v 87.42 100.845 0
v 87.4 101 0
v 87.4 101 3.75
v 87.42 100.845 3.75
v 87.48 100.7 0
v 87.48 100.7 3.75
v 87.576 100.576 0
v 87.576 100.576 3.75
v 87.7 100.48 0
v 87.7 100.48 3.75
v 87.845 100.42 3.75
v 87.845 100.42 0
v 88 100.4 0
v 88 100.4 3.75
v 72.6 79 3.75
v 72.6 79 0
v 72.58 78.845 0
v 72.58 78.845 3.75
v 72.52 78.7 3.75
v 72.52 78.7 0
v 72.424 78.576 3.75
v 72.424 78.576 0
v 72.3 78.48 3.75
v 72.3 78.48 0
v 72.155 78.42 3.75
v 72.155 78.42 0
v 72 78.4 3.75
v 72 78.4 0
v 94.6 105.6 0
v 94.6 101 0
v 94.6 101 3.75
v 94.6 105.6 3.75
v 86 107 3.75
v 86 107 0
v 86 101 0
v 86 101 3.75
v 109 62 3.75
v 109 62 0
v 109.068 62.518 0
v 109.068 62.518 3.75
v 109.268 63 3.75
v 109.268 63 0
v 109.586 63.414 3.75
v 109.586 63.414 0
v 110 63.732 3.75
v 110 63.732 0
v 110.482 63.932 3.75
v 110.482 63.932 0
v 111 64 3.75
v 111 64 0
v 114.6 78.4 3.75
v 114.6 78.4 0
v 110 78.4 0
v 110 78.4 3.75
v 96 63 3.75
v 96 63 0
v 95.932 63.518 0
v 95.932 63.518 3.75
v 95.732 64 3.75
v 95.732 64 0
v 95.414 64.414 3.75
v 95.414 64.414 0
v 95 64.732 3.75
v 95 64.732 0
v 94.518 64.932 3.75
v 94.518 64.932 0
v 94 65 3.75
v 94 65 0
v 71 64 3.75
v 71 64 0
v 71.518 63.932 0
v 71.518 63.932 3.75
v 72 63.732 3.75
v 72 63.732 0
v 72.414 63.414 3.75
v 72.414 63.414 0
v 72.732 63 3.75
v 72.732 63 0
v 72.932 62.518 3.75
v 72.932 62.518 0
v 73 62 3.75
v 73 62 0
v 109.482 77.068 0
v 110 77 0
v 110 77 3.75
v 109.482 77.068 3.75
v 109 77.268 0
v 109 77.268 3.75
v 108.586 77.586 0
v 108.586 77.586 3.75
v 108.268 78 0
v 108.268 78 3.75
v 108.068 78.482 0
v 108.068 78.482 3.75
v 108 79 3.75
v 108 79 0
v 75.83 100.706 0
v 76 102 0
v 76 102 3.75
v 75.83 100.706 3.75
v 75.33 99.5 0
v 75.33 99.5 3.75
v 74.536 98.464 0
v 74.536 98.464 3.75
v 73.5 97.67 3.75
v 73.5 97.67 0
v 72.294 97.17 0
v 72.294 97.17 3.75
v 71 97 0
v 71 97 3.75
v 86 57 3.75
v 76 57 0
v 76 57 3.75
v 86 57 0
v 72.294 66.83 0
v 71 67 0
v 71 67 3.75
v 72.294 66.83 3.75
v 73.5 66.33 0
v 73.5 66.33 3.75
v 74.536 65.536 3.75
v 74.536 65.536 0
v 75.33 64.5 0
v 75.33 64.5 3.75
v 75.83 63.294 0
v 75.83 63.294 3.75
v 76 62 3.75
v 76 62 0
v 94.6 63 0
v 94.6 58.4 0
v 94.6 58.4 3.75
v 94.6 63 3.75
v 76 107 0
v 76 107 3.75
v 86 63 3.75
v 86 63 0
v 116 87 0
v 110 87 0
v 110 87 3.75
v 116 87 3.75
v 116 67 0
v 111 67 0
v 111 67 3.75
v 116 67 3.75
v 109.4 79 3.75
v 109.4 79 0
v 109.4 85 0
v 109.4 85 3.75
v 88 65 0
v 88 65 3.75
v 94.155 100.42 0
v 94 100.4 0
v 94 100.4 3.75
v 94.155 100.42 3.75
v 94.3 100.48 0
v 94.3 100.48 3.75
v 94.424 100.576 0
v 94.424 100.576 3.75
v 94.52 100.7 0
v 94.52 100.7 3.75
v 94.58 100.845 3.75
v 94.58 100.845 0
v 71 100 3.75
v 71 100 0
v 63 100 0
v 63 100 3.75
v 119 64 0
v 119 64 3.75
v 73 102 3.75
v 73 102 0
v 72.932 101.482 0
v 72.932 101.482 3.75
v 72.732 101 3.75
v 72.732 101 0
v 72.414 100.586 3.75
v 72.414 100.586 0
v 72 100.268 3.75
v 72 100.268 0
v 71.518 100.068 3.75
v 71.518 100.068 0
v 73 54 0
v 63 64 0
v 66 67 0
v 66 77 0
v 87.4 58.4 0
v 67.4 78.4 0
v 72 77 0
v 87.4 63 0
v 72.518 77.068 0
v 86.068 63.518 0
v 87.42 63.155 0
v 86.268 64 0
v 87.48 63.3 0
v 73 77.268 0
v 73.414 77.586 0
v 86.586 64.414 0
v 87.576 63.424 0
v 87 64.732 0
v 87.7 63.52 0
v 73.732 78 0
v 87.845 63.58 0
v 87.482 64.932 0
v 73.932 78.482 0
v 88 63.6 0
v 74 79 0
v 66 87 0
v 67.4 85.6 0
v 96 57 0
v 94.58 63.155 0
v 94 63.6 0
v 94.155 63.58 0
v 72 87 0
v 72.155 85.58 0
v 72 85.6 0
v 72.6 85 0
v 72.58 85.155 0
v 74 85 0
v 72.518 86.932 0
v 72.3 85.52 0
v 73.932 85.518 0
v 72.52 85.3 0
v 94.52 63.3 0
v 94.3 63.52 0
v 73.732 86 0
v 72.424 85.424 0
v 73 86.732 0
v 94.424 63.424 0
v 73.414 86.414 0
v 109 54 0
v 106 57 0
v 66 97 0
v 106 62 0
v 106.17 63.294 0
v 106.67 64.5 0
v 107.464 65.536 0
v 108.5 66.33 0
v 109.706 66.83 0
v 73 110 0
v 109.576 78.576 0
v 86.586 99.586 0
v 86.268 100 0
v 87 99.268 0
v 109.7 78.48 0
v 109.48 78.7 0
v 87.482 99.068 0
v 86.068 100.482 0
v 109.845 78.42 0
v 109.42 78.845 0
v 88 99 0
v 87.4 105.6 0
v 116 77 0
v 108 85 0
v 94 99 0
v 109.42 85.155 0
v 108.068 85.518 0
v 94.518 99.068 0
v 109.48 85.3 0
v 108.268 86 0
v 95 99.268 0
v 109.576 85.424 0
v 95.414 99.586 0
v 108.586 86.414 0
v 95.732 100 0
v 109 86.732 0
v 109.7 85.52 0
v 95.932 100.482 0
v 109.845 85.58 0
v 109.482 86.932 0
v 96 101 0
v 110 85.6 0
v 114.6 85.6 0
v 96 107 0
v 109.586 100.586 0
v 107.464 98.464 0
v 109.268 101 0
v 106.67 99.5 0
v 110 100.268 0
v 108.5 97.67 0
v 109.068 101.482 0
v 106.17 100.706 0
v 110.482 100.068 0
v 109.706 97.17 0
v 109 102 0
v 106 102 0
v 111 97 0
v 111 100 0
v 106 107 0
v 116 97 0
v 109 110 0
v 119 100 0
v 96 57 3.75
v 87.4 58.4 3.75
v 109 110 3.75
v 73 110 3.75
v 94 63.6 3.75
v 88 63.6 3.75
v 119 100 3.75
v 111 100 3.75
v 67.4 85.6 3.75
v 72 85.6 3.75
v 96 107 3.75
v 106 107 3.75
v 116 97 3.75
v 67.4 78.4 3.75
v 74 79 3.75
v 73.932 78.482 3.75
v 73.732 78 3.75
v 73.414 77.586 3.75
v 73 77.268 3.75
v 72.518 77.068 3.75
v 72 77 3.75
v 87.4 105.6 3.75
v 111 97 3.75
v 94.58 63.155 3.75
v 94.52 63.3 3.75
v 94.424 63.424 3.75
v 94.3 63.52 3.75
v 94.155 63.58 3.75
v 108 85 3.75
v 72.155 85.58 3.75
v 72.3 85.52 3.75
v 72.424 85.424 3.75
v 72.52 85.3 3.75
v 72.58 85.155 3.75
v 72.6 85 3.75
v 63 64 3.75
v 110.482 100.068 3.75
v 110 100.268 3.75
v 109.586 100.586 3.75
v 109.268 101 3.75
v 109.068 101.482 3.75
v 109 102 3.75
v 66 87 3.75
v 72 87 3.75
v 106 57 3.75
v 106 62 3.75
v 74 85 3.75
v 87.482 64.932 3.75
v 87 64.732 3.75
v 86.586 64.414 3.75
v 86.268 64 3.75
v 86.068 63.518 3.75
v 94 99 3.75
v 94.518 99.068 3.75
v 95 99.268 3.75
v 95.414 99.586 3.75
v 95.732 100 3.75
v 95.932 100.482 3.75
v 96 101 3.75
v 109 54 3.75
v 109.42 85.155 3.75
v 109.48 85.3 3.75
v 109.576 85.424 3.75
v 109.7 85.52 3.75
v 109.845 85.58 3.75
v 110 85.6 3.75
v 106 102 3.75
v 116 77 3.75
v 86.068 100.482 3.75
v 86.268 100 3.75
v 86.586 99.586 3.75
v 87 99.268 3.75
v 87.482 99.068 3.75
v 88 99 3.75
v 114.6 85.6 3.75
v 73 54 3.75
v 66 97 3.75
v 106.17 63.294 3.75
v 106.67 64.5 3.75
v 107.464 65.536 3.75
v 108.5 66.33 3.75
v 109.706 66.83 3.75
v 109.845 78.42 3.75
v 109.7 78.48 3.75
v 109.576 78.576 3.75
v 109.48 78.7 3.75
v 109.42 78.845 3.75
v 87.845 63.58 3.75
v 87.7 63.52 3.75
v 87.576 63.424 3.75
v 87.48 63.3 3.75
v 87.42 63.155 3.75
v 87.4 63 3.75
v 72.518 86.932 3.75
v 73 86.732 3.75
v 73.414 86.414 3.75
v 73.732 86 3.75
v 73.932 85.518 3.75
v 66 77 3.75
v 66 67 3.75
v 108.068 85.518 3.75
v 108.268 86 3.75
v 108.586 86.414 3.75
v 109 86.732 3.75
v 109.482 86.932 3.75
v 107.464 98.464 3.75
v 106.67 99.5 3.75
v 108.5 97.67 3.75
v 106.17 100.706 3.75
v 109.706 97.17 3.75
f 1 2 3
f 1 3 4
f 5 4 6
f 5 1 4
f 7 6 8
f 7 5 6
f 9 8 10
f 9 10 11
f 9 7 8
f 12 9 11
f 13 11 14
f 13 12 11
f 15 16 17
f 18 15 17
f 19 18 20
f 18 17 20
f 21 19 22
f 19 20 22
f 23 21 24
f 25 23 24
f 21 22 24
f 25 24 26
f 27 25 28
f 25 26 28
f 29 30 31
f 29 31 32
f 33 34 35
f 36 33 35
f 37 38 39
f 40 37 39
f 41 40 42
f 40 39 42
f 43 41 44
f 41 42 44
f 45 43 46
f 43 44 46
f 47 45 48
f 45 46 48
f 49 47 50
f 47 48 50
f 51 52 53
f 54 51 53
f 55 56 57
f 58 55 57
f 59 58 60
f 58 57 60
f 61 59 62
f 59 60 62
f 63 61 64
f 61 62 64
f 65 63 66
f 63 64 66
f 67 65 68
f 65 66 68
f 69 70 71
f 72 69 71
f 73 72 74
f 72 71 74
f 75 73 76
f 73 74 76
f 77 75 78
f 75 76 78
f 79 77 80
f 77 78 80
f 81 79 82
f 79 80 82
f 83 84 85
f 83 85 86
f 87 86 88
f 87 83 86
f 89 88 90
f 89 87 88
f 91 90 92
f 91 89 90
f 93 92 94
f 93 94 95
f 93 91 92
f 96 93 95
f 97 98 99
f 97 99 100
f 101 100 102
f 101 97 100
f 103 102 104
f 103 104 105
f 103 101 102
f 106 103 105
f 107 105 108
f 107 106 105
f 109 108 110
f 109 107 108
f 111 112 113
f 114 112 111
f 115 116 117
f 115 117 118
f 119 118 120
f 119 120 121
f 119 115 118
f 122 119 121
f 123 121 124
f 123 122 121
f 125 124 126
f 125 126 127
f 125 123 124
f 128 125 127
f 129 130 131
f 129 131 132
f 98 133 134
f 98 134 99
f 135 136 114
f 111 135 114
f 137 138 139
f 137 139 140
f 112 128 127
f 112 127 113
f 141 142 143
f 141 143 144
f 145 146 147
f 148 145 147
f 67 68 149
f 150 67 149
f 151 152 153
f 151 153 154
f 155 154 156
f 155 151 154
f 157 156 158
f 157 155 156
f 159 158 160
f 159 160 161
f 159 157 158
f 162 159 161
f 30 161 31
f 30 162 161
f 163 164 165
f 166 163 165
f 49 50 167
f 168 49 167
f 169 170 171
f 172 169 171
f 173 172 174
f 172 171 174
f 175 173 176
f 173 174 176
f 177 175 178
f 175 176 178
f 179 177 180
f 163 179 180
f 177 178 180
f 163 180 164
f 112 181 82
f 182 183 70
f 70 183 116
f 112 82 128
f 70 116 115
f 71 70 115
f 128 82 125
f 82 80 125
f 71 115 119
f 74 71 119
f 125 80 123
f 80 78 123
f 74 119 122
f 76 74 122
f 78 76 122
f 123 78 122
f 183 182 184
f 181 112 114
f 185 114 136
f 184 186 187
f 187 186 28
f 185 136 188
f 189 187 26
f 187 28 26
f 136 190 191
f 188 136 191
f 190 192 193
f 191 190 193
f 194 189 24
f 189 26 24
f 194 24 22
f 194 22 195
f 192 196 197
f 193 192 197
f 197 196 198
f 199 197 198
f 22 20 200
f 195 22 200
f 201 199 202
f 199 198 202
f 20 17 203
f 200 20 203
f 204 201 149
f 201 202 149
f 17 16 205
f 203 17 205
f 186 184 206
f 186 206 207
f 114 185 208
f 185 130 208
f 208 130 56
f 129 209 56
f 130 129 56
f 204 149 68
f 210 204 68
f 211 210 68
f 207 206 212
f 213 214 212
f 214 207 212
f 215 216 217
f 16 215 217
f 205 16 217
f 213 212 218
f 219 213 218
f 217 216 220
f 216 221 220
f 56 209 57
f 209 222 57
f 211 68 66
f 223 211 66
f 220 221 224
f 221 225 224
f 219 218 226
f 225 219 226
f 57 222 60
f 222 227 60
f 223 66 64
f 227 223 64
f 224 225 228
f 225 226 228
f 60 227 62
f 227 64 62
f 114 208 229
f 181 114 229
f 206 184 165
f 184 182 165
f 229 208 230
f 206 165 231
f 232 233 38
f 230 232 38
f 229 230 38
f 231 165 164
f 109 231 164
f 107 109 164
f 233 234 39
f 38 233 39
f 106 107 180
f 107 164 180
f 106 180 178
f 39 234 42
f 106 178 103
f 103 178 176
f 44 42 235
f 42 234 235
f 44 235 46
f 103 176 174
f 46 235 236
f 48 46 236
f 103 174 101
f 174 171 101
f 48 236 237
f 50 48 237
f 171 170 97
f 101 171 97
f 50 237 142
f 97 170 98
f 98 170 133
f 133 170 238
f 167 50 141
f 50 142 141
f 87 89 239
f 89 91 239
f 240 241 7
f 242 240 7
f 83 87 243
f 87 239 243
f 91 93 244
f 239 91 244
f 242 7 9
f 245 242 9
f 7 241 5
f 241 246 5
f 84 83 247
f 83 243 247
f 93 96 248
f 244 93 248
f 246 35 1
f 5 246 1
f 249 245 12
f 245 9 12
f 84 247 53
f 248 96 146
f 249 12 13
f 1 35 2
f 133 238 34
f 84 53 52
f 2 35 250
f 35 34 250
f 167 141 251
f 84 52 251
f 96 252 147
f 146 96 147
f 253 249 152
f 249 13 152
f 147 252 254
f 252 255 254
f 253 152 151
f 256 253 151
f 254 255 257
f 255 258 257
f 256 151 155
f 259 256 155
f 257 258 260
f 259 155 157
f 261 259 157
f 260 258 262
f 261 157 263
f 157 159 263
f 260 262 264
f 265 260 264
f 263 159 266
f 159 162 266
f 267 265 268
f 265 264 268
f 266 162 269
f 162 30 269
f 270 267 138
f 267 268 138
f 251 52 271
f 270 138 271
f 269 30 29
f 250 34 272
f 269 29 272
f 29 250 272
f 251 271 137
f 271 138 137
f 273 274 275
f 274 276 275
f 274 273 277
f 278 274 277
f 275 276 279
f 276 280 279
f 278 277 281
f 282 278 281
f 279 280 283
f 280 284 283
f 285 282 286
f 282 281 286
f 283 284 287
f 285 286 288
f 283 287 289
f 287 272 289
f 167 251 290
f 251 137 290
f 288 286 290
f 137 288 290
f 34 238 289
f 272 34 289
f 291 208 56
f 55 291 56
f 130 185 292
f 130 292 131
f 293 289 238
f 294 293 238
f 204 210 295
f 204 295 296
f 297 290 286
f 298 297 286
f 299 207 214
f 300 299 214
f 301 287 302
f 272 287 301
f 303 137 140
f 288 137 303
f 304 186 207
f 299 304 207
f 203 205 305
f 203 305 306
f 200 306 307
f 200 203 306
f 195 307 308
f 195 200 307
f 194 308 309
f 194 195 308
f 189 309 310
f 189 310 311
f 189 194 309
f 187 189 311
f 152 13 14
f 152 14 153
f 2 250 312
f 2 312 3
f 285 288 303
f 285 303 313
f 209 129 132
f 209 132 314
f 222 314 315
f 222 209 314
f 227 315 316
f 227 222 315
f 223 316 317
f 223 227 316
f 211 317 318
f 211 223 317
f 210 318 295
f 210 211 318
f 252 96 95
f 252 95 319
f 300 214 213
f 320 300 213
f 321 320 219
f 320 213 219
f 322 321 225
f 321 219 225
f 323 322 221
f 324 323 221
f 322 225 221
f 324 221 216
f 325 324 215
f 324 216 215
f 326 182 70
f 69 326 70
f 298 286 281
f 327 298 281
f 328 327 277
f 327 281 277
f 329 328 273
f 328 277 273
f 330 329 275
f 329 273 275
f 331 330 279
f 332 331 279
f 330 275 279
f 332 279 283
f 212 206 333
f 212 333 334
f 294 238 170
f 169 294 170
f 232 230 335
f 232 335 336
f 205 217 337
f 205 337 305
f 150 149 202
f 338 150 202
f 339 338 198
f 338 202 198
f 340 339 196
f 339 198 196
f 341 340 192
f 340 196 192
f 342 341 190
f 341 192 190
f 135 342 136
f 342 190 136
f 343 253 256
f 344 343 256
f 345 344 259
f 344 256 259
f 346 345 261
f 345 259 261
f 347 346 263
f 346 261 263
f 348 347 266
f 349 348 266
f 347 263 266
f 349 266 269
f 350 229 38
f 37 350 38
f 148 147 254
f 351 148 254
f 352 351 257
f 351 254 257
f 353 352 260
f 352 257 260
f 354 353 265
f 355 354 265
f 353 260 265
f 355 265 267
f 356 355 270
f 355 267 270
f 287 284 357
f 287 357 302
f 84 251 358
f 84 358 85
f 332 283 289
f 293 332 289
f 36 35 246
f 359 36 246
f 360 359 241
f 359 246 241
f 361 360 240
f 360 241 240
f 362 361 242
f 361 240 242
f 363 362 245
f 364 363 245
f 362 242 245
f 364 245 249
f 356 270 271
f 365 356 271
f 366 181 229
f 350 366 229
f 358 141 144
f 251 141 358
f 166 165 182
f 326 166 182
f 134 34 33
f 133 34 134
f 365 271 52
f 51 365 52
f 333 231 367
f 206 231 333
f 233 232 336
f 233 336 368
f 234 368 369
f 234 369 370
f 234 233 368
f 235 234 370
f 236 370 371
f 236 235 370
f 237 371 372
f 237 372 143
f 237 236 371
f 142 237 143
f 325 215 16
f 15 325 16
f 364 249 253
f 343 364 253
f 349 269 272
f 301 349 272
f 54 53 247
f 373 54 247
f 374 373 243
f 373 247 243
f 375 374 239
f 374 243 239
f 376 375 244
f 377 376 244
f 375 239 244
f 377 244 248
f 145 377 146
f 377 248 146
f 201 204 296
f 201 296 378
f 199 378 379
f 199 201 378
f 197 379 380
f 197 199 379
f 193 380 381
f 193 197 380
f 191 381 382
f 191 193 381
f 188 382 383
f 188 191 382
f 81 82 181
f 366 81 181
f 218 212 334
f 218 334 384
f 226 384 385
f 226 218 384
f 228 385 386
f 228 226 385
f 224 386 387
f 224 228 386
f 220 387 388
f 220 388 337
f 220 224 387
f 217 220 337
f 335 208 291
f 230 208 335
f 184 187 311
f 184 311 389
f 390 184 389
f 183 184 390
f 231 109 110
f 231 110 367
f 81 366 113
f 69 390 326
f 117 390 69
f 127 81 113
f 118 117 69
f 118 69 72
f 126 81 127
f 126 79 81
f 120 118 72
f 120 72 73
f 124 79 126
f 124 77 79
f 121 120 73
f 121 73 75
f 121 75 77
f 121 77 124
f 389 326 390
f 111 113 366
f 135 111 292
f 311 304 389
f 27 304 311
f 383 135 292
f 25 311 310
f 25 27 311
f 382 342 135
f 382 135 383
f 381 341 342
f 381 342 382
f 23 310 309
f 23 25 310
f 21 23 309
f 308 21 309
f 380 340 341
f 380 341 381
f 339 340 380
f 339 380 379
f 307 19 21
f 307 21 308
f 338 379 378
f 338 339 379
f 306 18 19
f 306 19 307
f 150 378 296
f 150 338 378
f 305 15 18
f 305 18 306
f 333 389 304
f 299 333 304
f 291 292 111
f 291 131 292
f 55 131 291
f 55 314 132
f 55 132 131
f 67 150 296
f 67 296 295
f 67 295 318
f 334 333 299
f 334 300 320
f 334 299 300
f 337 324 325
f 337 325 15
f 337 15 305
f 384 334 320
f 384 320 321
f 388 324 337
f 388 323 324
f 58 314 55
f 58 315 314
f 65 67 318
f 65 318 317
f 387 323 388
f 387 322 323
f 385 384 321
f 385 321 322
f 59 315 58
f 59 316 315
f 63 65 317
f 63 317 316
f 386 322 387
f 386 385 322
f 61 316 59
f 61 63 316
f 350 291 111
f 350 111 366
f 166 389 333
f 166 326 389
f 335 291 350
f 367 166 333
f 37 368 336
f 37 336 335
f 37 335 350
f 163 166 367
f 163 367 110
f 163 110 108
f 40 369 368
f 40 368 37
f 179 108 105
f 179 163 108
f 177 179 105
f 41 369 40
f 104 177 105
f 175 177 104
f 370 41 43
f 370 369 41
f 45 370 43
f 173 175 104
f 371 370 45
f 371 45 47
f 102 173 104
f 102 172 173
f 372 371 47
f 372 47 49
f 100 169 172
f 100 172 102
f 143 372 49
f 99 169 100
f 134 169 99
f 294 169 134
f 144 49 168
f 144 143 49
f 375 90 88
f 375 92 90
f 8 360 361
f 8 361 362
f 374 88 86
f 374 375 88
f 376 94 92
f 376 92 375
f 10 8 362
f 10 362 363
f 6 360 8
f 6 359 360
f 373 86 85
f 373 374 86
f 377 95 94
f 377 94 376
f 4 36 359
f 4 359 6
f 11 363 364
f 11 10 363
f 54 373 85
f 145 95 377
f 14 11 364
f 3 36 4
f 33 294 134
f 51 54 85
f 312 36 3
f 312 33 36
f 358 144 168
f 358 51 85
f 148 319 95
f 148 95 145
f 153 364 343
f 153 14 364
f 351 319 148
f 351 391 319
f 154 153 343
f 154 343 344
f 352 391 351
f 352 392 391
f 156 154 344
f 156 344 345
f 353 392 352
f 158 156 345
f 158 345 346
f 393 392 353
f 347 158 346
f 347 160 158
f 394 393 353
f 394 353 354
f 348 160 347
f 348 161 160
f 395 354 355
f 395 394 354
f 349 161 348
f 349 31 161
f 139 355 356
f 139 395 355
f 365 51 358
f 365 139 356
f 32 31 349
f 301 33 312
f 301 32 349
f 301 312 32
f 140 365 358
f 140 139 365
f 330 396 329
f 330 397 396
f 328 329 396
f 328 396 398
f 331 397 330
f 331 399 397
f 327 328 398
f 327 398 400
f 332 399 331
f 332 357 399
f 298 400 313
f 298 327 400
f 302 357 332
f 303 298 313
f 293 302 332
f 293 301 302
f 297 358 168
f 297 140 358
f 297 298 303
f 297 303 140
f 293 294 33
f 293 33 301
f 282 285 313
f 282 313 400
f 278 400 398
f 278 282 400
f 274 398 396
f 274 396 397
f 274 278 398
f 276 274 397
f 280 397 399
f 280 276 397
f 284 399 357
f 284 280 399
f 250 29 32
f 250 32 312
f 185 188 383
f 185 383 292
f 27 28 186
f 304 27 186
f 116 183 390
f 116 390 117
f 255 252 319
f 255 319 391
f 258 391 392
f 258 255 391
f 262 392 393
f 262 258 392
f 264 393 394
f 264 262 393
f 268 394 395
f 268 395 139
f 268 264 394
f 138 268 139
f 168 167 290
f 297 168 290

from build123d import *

# Parameters (mm, degrees)
EXTRUDE_THIN1_DEPTH = 3.75
EXTRUDE_THIN2_DEPTH = 3.75
EXTRUDE_THIN3_DEPTH = 3.75


with BuildPart() as part:
    # Sketch1 → Extrude-Thin1 (new body)
    with BuildSketch(Plane.XY):
        with BuildLine():
            Line((73, 62), (73, 54))
            Line((73, 54), (109, 54))
            Line((109, 54), (109, 62))
            ThreePointArc((109, 62), (109.585786438, 63.414213562), (111, 64))
            Line((111, 64), (119, 64))
            Line((119, 64), (119, 100))
            Line((119, 100), (111, 100))
            ThreePointArc((111, 100), (109.585786438, 100.585786438), (109, 102))
            Line((109, 102), (109, 110))
            Line((109, 110), (73, 110))
            Line((73, 110), (73, 102))
            ThreePointArc((73, 102), (72.414213562, 100.585786438), (71, 100))
            Line((71, 100), (63, 100))
            Line((63, 100), (63, 64))
            Line((63, 64), (71, 64))
            ThreePointArc((71, 64), (72.414213562, 63.414213562), (73, 62))
        make_face()
        with BuildLine():
            Line((76, 62), (76, 57))
            Line((76, 57), (106, 57))
            Line((106, 57), (106, 62))
            ThreePointArc((106, 62), (107.464466094, 65.535533906), (111, 67))
            Line((111, 67), (116, 67))
            Line((116, 67), (116, 97))
            Line((116, 97), (111, 97))
            ThreePointArc((111, 97), (107.464466094, 98.464466094), (106, 102))
            Line((106, 102), (106, 107))
            Line((106, 107), (76, 107))
            Line((76, 107), (76, 102))
            ThreePointArc((76, 102), (74.535533906, 98.464466094), (71, 97))
            Line((71, 97), (66, 97))
            Line((66, 97), (66, 67))
            Line((66, 67), (71, 67))
            ThreePointArc((71, 67), (74.535533906, 65.535533906), (76, 62))
        make_face(mode=Mode.SUBTRACT)
    extrude(amount=EXTRUDE_THIN1_DEPTH)

    # Sketch2 → Extrude-Thin2 (add)
    # profile 1 of 2: a face of its own
    with BuildSketch(Plane.XY):
        with BuildLine():
            Line((74, 85), (74, 79))
            ThreePointArc((74, 79), (73.414213562, 77.585786438), (72, 77))
            Line((72, 77), (66, 77))
            Line((66, 77), (66, 87))
            Line((66, 87), (72, 87))
            ThreePointArc((72, 87), (73.414213562, 86.414213562), (74, 85))
        make_face()
        with BuildLine():
            Line((72.6, 85), (72.6, 79))
            ThreePointArc((72.6, 79), (72.424264069, 78.575735931), (72, 78.4))
            Line((72, 78.4), (67.4, 78.4))
            Line((67.4, 78.4), (67.4, 85.6))
            Line((67.4, 85.6), (72, 85.6))
            ThreePointArc((72, 85.6), (72.424264069, 85.424264069), (72.6, 85))
        make_face(mode=Mode.SUBTRACT)
    # profile 2 of 2: a face of its own
    with BuildSketch(Plane.XY):
        with BuildLine():
            Line((108, 79), (108, 85))
            ThreePointArc((108, 85), (108.585786438, 86.414213562), (110, 87))
            Line((110, 87), (116, 87))
            Line((116, 87), (116, 77))
            Line((116, 77), (110, 77))
            ThreePointArc((110, 77), (108.585786438, 77.585786438), (108, 79))
        make_face()
        with BuildLine():
            Line((109.4, 79), (109.4, 85))
            ThreePointArc((109.4, 85), (109.575735931, 85.424264069), (110, 85.6))
            Line((110, 85.6), (114.6, 85.6))
            Line((114.6, 85.6), (114.6, 78.4))
            Line((114.6, 78.4), (110, 78.4))
            ThreePointArc((110, 78.4), (109.575735931, 78.575735931), (109.4, 79))
        make_face(mode=Mode.SUBTRACT)
    extrude(amount=EXTRUDE_THIN2_DEPTH)

    # Sketch3 → Extrude-Thin3 (add)
    # profile 1 of 2: a face of its own
    with BuildSketch(Plane.XY):
        with BuildLine():
            Line((96, 101), (96, 107))
            Line((96, 107), (86, 107))
            Line((86, 107), (86, 101))
            ThreePointArc((86, 101), (86.585786438, 99.585786438), (88, 99))
            Line((88, 99), (94, 99))
            ThreePointArc((94, 99), (95.414213562, 99.585786438), (96, 101))
        make_face()
        with BuildLine():
            Line((94.6, 101), (94.6, 105.6))
            Line((94.6, 105.6), (87.4, 105.6))
            Line((87.4, 105.6), (87.4, 101))
            ThreePointArc((87.4, 101), (87.575735931, 100.575735931), (88, 100.4))
            Line((88, 100.4), (94, 100.4))
            ThreePointArc((94, 100.4), (94.424264069, 100.575735931), (94.6, 101))
        make_face(mode=Mode.SUBTRACT)
    # profile 2 of 2: a face of its own
    with BuildSketch(Plane.XY):
        with BuildLine():
            Line((86, 63), (86, 57))
            Line((86, 57), (96, 57))
            Line((96, 57), (96, 63))
            ThreePointArc((96, 63), (95.414213562, 64.414213562), (94, 65))
            Line((94, 65), (88, 65))
            ThreePointArc((88, 65), (86.585786438, 64.414213562), (86, 63))
        make_face()
        with BuildLine():
            Line((87.4, 63), (87.4, 58.4))
            Line((87.4, 58.4), (94.6, 58.4))
            Line((94.6, 58.4), (94.6, 63))
            ThreePointArc((94.6, 63), (94.424264069, 63.424264069), (94, 63.6))
            Line((94, 63.6), (88, 63.6))
            ThreePointArc((88, 63.6), (87.575735931, 63.424264069), (87.4, 63))
        make_face(mode=Mode.SUBTRACT)
    extrude(amount=EXTRUDE_THIN3_DEPTH)


solid = part.part
